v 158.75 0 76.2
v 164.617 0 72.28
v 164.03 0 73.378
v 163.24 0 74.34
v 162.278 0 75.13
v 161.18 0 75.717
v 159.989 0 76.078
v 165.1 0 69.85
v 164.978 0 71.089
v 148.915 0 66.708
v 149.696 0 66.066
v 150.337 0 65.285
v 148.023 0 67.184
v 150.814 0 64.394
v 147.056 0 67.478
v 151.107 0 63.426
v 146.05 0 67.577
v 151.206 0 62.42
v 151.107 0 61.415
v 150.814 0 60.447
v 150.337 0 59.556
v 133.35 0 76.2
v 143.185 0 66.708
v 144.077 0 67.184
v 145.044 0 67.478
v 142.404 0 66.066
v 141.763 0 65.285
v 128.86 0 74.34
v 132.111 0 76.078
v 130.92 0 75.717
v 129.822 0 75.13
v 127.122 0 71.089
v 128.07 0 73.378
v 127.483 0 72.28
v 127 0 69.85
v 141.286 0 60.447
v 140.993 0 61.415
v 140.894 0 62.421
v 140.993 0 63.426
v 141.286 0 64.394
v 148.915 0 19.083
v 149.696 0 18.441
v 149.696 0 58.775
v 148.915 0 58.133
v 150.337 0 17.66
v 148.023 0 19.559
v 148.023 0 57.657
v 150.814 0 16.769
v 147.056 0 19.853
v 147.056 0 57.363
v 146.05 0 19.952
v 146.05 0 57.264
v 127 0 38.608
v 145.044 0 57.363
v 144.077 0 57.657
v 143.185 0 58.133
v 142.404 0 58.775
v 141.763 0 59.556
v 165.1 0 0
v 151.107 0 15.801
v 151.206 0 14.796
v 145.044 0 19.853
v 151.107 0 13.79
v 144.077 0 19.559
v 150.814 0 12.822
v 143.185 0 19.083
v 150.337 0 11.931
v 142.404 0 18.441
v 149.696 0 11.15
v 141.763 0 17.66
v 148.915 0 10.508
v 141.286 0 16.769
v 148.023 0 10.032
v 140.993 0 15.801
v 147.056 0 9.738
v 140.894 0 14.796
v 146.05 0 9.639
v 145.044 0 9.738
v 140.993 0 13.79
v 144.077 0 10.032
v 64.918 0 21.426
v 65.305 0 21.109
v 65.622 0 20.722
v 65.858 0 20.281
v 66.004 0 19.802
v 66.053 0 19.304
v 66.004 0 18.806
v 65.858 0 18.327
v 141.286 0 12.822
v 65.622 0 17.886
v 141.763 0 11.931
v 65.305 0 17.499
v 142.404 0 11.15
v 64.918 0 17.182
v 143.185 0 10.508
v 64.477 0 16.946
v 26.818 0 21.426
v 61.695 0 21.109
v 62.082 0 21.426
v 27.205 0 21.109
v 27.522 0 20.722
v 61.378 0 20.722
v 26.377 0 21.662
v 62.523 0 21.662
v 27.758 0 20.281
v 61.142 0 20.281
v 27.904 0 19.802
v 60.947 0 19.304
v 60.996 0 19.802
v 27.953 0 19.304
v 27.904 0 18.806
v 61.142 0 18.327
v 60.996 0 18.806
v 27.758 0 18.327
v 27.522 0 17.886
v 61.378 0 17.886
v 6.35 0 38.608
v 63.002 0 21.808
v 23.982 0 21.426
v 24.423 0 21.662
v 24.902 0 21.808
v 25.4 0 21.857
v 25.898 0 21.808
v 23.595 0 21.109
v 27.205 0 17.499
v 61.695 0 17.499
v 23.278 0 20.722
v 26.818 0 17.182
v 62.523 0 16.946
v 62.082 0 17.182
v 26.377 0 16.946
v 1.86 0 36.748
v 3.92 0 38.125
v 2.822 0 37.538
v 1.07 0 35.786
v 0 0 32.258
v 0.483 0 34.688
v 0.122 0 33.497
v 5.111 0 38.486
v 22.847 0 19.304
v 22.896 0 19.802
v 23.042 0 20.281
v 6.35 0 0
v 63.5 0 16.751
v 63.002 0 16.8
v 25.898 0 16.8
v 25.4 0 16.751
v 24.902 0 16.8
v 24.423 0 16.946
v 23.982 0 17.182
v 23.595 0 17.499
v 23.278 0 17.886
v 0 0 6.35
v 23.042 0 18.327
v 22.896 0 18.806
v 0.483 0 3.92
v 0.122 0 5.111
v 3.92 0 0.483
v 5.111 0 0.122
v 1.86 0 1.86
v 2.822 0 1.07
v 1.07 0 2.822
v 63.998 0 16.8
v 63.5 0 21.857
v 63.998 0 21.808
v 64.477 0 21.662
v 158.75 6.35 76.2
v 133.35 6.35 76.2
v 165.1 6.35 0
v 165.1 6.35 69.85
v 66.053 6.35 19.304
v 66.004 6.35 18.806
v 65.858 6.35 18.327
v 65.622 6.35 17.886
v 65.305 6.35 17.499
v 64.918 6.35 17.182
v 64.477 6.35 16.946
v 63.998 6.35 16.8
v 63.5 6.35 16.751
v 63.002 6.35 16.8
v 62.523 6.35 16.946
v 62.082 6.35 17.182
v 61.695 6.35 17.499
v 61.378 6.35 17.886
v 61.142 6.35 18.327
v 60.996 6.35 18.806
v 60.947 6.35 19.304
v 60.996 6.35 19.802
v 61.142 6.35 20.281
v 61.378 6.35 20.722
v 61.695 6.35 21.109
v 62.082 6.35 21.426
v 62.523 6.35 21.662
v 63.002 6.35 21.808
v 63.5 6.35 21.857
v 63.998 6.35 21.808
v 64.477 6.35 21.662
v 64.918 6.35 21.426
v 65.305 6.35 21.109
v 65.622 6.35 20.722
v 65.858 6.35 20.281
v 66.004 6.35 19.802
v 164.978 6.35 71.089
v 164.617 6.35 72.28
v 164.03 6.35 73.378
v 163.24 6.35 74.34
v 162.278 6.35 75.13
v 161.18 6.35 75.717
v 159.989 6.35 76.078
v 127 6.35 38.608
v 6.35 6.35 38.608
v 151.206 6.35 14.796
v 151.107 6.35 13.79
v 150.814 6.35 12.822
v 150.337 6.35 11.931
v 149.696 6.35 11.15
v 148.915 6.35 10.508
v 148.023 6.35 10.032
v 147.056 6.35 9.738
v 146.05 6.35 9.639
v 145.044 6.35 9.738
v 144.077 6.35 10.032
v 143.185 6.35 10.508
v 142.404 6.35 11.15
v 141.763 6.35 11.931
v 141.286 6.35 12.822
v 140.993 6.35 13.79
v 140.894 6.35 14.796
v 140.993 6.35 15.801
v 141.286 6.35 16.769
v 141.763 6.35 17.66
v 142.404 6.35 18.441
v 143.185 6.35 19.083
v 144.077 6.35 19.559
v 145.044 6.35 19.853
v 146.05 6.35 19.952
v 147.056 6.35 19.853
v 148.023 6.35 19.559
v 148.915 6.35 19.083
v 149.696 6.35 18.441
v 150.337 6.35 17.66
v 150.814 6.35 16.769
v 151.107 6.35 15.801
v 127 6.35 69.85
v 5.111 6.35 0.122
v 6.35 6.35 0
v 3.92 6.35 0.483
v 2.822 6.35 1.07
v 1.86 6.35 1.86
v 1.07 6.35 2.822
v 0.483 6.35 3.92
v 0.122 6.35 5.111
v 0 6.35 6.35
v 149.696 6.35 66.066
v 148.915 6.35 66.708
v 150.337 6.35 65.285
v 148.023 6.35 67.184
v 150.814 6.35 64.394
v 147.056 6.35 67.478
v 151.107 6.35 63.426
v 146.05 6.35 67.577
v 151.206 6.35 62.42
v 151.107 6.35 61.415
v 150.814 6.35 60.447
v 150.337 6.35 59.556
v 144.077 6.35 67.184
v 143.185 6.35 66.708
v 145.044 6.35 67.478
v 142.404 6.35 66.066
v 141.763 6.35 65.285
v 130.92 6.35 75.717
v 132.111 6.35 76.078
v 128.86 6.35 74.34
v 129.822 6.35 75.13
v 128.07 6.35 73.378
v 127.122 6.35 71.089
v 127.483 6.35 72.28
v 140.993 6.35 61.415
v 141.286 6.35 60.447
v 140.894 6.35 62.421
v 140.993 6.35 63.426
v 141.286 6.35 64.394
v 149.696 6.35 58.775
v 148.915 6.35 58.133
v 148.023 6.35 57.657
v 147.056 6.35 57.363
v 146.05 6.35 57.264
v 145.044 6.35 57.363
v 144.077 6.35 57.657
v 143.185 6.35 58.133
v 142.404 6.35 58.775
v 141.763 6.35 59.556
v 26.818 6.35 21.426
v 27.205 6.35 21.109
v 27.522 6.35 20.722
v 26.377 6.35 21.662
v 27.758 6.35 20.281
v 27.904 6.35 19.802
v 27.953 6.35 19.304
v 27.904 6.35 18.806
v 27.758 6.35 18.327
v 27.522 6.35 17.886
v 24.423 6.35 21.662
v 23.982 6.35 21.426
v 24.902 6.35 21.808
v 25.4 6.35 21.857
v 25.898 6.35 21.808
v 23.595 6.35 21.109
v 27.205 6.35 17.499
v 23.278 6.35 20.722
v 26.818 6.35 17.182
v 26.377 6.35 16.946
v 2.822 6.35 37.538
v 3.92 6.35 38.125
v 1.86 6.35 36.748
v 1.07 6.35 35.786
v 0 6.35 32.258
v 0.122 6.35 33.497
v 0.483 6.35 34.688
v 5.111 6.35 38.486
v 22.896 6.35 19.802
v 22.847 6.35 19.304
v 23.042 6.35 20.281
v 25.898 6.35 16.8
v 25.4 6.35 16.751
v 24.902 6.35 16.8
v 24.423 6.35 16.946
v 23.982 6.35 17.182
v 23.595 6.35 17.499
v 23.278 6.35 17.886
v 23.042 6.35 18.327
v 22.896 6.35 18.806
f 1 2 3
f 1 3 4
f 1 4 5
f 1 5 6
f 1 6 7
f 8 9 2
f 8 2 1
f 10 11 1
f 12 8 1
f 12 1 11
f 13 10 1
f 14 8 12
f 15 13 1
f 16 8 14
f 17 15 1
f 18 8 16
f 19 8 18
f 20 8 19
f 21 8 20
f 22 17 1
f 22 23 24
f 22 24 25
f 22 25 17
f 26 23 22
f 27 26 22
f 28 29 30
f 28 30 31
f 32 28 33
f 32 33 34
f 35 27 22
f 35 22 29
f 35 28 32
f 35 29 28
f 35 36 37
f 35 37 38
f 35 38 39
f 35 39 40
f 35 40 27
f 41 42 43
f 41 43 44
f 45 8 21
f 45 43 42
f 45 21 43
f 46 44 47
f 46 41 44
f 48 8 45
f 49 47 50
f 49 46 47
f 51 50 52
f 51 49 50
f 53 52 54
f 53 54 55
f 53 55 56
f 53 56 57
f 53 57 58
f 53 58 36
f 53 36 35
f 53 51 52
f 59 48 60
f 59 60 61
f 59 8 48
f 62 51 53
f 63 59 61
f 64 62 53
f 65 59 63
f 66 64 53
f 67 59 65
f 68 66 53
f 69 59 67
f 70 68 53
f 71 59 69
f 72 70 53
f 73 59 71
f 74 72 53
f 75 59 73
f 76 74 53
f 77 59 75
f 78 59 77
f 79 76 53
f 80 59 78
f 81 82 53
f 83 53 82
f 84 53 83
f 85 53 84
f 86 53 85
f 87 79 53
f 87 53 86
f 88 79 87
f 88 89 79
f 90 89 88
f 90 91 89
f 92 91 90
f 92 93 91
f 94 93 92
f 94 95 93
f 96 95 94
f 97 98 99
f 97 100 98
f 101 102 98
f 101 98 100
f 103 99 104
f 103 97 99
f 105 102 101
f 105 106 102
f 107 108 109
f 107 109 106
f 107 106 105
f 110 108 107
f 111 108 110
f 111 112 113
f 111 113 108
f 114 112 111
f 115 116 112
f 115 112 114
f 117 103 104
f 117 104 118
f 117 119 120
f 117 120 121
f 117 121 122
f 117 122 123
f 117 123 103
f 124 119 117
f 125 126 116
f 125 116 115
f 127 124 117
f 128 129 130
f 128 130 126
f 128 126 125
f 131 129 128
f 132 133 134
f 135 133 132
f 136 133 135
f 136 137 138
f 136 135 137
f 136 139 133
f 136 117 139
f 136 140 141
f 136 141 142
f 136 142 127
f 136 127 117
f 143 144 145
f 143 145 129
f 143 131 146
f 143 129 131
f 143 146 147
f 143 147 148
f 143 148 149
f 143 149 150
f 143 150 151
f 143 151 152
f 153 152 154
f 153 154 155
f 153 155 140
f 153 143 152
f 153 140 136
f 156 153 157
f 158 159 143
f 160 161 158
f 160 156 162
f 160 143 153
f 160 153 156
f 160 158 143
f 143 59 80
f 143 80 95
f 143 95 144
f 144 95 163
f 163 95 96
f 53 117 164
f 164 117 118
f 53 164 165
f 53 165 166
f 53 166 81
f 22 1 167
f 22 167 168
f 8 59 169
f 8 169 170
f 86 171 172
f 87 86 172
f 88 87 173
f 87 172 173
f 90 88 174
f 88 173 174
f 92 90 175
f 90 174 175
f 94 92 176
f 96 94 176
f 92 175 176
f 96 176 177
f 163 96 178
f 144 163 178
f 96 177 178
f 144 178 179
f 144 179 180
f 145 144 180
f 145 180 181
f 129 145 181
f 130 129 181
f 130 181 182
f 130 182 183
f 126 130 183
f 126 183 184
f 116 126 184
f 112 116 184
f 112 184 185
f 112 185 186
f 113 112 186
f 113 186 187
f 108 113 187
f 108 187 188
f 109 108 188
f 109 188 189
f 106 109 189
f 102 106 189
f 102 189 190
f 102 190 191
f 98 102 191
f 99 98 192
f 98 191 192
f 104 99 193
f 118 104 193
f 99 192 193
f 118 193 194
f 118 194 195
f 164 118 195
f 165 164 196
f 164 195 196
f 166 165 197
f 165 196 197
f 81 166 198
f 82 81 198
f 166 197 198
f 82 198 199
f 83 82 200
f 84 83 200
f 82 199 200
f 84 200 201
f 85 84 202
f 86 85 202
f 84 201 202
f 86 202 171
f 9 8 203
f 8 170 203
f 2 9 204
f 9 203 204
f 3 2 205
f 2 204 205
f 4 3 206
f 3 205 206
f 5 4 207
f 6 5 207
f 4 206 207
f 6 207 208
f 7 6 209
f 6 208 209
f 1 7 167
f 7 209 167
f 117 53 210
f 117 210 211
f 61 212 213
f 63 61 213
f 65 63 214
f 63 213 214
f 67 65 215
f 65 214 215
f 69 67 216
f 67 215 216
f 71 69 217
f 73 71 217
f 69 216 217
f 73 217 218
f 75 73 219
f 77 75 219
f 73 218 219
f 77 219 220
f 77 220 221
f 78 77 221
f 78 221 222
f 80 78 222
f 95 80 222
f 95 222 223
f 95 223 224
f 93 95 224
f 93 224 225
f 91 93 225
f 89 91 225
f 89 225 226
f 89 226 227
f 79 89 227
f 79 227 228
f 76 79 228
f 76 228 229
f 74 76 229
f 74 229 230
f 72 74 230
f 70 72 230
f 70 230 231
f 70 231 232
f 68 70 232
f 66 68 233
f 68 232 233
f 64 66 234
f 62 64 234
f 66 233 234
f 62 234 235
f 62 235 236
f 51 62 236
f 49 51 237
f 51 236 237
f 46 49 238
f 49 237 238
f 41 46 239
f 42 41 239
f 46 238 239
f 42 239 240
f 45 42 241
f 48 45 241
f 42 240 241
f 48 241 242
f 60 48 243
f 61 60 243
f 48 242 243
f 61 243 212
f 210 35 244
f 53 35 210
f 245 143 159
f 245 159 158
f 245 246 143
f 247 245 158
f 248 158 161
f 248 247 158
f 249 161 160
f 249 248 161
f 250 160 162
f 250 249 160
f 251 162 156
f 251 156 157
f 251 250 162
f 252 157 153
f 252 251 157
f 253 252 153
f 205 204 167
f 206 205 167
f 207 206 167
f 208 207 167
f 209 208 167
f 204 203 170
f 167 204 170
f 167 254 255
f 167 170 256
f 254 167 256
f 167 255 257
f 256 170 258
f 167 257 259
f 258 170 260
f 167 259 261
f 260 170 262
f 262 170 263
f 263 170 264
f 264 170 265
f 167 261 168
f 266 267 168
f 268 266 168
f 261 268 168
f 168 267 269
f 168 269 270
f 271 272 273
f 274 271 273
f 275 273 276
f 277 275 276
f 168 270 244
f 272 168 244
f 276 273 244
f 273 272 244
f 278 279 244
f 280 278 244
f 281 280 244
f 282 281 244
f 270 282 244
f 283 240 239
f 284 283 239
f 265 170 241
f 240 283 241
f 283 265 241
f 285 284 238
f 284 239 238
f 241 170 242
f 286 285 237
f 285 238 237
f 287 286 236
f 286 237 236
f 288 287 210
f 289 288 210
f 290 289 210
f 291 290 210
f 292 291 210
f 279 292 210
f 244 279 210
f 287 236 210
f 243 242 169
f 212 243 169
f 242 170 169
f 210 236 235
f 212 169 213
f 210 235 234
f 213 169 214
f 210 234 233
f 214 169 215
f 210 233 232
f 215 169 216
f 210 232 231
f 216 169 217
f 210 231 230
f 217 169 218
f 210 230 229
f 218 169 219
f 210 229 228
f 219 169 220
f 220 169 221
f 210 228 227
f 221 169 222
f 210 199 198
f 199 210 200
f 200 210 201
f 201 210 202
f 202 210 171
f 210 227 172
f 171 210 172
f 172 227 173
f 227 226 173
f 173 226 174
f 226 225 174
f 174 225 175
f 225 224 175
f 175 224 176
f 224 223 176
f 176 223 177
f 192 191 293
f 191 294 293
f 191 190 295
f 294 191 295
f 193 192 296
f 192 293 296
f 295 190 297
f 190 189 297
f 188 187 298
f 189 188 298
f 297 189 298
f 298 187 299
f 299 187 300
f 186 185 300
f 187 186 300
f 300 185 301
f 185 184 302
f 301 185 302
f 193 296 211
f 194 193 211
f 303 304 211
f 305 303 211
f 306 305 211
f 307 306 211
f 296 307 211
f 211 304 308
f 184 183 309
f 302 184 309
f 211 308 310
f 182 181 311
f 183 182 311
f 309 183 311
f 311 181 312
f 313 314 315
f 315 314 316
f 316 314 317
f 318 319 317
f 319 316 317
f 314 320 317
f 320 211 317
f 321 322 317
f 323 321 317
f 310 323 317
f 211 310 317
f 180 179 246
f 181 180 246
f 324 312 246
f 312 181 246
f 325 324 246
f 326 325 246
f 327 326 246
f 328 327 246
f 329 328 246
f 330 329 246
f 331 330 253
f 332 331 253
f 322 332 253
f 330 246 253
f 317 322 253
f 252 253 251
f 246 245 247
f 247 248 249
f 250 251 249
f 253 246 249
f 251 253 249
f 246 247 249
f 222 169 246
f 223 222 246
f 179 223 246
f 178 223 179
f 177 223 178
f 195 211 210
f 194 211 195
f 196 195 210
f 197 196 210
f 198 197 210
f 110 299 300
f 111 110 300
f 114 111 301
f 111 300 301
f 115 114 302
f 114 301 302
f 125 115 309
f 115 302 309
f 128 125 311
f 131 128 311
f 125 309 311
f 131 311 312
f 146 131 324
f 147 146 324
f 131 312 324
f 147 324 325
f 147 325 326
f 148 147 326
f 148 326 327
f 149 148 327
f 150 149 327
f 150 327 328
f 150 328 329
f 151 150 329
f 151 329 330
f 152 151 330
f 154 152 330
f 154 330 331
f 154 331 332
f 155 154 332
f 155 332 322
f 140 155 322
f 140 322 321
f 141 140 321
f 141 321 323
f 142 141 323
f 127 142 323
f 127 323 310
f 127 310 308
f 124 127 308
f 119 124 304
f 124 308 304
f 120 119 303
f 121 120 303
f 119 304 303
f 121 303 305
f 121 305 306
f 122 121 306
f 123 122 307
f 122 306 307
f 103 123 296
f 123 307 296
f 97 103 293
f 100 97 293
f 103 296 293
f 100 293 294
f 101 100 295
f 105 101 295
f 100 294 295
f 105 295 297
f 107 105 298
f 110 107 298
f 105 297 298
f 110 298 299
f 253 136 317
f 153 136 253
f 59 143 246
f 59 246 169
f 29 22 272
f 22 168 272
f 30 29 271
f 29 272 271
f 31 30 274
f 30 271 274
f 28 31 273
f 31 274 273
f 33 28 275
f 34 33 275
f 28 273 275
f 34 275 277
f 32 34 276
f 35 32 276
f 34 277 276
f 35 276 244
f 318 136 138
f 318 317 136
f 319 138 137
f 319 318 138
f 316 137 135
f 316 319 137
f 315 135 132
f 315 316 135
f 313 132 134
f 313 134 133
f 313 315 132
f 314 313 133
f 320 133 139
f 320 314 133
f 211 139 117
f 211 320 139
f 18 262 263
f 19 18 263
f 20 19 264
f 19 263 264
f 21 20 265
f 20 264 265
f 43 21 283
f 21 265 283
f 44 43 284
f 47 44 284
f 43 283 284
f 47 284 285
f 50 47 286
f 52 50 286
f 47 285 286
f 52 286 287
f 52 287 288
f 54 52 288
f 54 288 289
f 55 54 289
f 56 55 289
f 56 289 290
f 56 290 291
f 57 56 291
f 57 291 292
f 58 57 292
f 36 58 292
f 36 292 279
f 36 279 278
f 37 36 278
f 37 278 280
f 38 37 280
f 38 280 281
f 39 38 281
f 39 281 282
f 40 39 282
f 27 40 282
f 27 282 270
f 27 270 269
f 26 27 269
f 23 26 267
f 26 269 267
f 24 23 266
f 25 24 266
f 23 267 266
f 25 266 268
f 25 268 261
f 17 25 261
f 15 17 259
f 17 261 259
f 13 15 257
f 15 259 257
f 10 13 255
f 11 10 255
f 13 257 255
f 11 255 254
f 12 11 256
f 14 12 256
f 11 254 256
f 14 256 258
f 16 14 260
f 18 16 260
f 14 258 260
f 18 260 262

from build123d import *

# Parameters (mm, degrees)
BOSS_EXTRUDE1_DEPTH = 6.35
CUT_EXTRUDE1_REACH  = 8.35
SKETCH4_R           = 2.5527
SKETCH4_R_2         = 5.1562
FILLET1_R           = 6.35


with BuildPart() as part:
    # Sketch3 → Boss-Extrude1 (new body)
    with BuildSketch(Plane(origin=(0, 0, 0), x_dir=(1, 0, 0), z_dir=(0, 1, 0))):
        Polygon((0, 0), (165.1, 0), (165.1, -76.2), (127, -76.2), (127, -38.608), (0, -38.608), align=None)
    extrude(amount=BOSS_EXTRUDE1_DEPTH)

    # Sketch4 → Cut-Extrude1 (cut, up to next)
    with BuildSketch(Plane(origin=(0, 6.35, 0), x_dir=(1, 0, 0), z_dir=(0, 1, 0)), mode=Mode.PRIVATE) as cut_extrude1_sk1:
        with Locations((25.4, -19.304)):
            Circle(SKETCH4_R)
    cut_extrude1_tool1 = extrude(cut_extrude1_sk1.sketch, amount=-CUT_EXTRUDE1_REACH, mode=Mode.PRIVATE) & part.part
    add(cut_extrude1_tool1.solids().sort_by_distance((25.4, 6.35, 19.304))[0], mode=Mode.SUBTRACT)
    # Sketch4 → Cut-Extrude1 (cut, up to next)
    with BuildSketch(Plane(origin=(0, 6.35, 0), x_dir=(1, 0, 0), z_dir=(0, 1, 0)), mode=Mode.PRIVATE) as cut_extrude1_sk2:
        with Locations((63.5, -19.304)):
            Circle(SKETCH4_R)
    cut_extrude1_tool2 = extrude(cut_extrude1_sk2.sketch, amount=-CUT_EXTRUDE1_REACH, mode=Mode.PRIVATE) & part.part
    add(cut_extrude1_tool2.solids().sort_by_distance((63.5, 6.35, 19.304))[0], mode=Mode.SUBTRACT)
    # Sketch4 → Cut-Extrude1 (cut, up to next)
    with BuildSketch(Plane(origin=(0, 6.35, 0), x_dir=(1, 0, 0), z_dir=(0, 1, 0)), mode=Mode.PRIVATE) as cut_extrude1_sk3:
        with Locations((146.05, -14.7955)):
            Circle(SKETCH4_R_2)
    cut_extrude1_tool3 = extrude(cut_extrude1_sk3.sketch, amount=-CUT_EXTRUDE1_REACH, mode=Mode.PRIVATE) & part.part
    add(cut_extrude1_tool3.solids().sort_by_distance((146.05, 6.35, 14.7955))[0], mode=Mode.SUBTRACT)
    # Sketch4 → Cut-Extrude1 (cut, up to next)
    with BuildSketch(Plane(origin=(0, 6.35, 0), x_dir=(1, 0, 0), z_dir=(0, 1, 0)), mode=Mode.PRIVATE) as cut_extrude1_sk4:
        with Locations((146.05, -62.4205)):
            Circle(SKETCH4_R_2)
    cut_extrude1_tool4 = extrude(cut_extrude1_sk4.sketch, amount=-CUT_EXTRUDE1_REACH, mode=Mode.PRIVATE) & part.part
    add(cut_extrude1_tool4.solids().sort_by_distance((146.05, 6.35, 62.4205))[0], mode=Mode.SUBTRACT)

    # Fillet1
    fillet1_edges = [part.edges().sort_by_distance(p)[0] for p in [
        (0, 3.175, 0),
        (165.1, 3.175, 76.2),
        (127, 3.175, 76.2),
        (0, 3.175, 38.608),
    ]]
    fillet(fillet1_edges, radius=FILLET1_R)


solid = part.part
